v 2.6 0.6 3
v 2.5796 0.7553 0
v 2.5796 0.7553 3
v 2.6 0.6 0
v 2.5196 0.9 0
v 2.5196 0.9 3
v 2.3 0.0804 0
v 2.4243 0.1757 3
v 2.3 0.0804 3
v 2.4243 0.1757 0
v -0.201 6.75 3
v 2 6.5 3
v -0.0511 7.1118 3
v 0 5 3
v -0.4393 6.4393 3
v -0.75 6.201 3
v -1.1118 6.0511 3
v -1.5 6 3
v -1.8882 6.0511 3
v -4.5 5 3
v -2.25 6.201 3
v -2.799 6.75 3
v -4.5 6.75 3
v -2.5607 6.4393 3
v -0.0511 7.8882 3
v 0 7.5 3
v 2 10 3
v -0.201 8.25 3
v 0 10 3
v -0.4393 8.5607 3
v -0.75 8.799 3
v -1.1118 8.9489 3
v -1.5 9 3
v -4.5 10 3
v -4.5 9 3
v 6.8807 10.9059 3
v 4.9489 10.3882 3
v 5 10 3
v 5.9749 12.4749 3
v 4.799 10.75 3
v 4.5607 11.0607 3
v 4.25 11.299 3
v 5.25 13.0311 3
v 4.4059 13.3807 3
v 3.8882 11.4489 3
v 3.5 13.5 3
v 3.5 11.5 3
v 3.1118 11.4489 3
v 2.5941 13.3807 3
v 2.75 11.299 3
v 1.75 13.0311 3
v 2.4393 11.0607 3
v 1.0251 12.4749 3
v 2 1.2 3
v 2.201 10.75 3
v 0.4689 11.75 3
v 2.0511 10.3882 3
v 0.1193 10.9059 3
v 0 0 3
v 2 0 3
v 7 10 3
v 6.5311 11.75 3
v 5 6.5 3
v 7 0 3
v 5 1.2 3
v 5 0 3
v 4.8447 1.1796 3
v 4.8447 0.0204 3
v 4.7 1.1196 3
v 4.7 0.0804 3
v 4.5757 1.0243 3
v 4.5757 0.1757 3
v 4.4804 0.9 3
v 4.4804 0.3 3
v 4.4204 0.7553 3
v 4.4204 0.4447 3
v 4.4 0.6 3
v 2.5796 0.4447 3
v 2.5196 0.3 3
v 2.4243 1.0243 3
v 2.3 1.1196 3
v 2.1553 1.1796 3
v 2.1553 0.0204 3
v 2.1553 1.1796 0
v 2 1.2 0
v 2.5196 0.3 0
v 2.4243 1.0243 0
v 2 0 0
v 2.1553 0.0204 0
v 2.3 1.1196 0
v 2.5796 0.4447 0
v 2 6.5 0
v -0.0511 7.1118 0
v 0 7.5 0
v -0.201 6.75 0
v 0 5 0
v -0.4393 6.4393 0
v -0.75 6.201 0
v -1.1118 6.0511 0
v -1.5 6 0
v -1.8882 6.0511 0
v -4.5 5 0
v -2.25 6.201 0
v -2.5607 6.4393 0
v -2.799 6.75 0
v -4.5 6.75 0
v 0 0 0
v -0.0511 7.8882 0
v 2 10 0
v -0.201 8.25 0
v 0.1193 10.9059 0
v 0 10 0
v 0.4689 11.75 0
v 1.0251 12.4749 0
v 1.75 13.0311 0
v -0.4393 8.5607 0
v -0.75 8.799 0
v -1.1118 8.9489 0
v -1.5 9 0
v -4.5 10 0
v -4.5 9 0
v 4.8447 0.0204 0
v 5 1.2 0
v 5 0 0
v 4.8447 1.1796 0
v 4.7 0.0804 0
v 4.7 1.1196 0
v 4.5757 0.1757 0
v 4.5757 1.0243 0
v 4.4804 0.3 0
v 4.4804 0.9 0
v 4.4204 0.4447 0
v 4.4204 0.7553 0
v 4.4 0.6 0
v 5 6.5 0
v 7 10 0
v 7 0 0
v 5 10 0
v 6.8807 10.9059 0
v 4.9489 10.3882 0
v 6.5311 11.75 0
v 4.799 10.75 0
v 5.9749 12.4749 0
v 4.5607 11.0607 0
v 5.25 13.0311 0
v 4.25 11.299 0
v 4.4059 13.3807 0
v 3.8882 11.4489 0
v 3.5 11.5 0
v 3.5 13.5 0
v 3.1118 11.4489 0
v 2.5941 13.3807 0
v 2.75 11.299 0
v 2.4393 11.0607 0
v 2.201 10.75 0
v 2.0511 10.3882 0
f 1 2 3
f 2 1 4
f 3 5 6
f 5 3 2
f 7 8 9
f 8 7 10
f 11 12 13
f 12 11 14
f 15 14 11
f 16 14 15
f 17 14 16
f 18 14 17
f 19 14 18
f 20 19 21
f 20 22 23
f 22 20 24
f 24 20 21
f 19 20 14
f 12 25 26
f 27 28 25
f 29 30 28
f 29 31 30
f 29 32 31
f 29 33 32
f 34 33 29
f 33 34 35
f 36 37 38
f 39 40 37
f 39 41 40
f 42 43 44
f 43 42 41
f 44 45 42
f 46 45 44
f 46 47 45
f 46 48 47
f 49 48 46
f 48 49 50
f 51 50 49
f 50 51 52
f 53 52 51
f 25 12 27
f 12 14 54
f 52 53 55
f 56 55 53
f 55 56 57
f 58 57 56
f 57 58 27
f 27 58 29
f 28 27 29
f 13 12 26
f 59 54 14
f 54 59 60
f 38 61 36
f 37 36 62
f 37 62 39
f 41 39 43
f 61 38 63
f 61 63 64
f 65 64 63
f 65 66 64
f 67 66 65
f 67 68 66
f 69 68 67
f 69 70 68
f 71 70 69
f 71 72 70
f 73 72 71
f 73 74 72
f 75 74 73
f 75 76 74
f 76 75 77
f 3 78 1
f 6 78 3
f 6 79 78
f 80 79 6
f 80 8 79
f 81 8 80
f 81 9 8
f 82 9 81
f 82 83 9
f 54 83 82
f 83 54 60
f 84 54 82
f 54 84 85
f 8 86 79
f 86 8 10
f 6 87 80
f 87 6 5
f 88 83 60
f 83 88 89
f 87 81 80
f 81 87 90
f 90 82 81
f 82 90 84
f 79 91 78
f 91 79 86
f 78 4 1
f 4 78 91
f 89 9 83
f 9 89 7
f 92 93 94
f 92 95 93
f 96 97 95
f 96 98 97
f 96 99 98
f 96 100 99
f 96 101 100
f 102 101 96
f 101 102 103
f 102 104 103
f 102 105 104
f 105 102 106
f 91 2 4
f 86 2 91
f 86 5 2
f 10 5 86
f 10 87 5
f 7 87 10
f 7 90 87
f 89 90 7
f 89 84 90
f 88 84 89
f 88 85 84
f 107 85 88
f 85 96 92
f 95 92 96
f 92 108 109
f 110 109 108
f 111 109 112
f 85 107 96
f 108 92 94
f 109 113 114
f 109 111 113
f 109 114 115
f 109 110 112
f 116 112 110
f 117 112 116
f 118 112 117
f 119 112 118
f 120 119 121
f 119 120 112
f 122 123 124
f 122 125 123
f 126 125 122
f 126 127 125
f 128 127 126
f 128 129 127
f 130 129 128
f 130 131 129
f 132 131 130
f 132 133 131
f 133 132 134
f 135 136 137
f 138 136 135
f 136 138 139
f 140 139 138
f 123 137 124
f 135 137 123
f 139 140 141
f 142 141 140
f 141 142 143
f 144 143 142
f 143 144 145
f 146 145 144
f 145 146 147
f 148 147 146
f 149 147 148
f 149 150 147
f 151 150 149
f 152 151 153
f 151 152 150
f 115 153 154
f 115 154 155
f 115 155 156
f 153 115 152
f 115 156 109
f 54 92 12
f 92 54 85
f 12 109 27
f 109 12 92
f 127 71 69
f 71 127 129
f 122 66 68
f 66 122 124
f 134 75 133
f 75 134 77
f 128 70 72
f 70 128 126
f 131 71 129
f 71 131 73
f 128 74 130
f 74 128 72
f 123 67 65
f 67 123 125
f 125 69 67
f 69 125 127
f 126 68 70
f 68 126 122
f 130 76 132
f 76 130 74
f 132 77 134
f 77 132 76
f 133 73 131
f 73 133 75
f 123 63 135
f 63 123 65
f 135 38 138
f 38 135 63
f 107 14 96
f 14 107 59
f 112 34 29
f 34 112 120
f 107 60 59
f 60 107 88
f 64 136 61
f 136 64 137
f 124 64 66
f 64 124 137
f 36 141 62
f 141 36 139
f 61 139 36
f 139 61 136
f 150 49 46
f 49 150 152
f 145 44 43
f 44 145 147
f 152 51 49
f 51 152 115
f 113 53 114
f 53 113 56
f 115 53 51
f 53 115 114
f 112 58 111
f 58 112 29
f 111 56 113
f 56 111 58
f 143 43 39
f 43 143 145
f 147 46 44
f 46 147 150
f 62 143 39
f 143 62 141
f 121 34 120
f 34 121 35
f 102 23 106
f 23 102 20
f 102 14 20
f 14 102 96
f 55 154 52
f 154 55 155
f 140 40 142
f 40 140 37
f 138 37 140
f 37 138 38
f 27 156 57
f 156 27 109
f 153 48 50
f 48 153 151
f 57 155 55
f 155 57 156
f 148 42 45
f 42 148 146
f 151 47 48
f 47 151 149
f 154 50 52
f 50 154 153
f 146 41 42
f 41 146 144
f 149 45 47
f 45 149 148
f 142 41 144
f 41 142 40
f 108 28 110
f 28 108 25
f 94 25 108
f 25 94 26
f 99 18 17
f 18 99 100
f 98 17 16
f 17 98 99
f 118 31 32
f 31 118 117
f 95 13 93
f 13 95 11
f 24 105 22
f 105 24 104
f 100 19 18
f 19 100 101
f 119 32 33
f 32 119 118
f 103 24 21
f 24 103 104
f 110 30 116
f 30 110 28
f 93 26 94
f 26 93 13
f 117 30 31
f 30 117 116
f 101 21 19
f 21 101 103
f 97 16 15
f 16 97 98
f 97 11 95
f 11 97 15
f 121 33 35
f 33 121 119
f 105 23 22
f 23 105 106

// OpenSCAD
//Customizable Filament Clip by Dealmann


//Diameter of your filament.
fc_filament=3;

//Thickness of your spool.
fc_spool=2;

//In case your spool has a rim.
fc_rim=0;

//Length of the clips "arms".
fc_length=10;

//Width of the clip.
fc_width=3;

//Thickness of the clip.
fc_thickness=2;





difference()
	{
		union()
			{
				cube([fc_thickness, fc_length, fc_width]);

				translate([fc_thickness+fc_rim+fc_spool+1, 0, 0])
				cube([fc_thickness, fc_length, fc_width]);

				translate([fc_thickness+(fc_rim+fc_spool+1)/2, fc_length,0])
				cylinder(r=fc_thickness+(fc_rim+fc_spool+1)/2, h=fc_width, $fn=24);

				difference()
					{
						translate([fc_thickness,0.5+fc_rim/2+fc_spool*0.05,0])
						cylinder(r=0.5+fc_rim/2+fc_spool*0.05,h=fc_width, $fn=24);

						translate([fc_thickness-(0.5+fc_rim/2+fc_spool*0.05+1),0,-1])
						cube([0.5+fc_rim/2+fc_spool*0.05+1,(0.5+fc_rim/2+fc_spool*0.05)*2,fc_width+2]);
					}
				
				difference()
					{
						translate([fc_thickness+fc_rim+fc_spool+1,0.5+fc_rim/2+fc_spool*0.05,0])
						cylinder(r=0.5+fc_rim/2+fc_spool*0.05,h=fc_width, $fn=24);

						translate([fc_thickness+fc_rim+fc_spool+1,0,-1])
						cube([0.5+fc_rim/2+fc_spool*0.05+1,(0.5+fc_rim/2+fc_spool*0.05)*2,fc_width+2]);
				
					}

				translate([-fc_filament*1.5,fc_length-(fc_filament+2),0])
				cube([fc_filament*1.5,fc_filament+2,fc_width]);

			}
		translate([fc_thickness+(fc_rim+fc_spool+1)/2, fc_length,-1])
		cylinder(r=(fc_rim+fc_spool+1)/2, h=fc_width+2, $fn=24);

		translate([fc_thickness,fc_length-(fc_thickness+(fc_rim+fc_spool+1)/2),-1])
		cube([fc_rim+fc_spool+1, fc_thickness+(fc_rim+fc_spool+1)/2, fc_width+2]);

		translate([-fc_filament/2,fc_length-fc_filament/2-1,-1])
		cylinder(r=fc_filament/2, h=fc_width+2, $fn=24);

		translate([-fc_filament*1.5-1,fc_length-fc_filament*0.75-1,-1])
		cube([fc_filament+1,fc_filament*0.75,fc_width+2]);
	}
